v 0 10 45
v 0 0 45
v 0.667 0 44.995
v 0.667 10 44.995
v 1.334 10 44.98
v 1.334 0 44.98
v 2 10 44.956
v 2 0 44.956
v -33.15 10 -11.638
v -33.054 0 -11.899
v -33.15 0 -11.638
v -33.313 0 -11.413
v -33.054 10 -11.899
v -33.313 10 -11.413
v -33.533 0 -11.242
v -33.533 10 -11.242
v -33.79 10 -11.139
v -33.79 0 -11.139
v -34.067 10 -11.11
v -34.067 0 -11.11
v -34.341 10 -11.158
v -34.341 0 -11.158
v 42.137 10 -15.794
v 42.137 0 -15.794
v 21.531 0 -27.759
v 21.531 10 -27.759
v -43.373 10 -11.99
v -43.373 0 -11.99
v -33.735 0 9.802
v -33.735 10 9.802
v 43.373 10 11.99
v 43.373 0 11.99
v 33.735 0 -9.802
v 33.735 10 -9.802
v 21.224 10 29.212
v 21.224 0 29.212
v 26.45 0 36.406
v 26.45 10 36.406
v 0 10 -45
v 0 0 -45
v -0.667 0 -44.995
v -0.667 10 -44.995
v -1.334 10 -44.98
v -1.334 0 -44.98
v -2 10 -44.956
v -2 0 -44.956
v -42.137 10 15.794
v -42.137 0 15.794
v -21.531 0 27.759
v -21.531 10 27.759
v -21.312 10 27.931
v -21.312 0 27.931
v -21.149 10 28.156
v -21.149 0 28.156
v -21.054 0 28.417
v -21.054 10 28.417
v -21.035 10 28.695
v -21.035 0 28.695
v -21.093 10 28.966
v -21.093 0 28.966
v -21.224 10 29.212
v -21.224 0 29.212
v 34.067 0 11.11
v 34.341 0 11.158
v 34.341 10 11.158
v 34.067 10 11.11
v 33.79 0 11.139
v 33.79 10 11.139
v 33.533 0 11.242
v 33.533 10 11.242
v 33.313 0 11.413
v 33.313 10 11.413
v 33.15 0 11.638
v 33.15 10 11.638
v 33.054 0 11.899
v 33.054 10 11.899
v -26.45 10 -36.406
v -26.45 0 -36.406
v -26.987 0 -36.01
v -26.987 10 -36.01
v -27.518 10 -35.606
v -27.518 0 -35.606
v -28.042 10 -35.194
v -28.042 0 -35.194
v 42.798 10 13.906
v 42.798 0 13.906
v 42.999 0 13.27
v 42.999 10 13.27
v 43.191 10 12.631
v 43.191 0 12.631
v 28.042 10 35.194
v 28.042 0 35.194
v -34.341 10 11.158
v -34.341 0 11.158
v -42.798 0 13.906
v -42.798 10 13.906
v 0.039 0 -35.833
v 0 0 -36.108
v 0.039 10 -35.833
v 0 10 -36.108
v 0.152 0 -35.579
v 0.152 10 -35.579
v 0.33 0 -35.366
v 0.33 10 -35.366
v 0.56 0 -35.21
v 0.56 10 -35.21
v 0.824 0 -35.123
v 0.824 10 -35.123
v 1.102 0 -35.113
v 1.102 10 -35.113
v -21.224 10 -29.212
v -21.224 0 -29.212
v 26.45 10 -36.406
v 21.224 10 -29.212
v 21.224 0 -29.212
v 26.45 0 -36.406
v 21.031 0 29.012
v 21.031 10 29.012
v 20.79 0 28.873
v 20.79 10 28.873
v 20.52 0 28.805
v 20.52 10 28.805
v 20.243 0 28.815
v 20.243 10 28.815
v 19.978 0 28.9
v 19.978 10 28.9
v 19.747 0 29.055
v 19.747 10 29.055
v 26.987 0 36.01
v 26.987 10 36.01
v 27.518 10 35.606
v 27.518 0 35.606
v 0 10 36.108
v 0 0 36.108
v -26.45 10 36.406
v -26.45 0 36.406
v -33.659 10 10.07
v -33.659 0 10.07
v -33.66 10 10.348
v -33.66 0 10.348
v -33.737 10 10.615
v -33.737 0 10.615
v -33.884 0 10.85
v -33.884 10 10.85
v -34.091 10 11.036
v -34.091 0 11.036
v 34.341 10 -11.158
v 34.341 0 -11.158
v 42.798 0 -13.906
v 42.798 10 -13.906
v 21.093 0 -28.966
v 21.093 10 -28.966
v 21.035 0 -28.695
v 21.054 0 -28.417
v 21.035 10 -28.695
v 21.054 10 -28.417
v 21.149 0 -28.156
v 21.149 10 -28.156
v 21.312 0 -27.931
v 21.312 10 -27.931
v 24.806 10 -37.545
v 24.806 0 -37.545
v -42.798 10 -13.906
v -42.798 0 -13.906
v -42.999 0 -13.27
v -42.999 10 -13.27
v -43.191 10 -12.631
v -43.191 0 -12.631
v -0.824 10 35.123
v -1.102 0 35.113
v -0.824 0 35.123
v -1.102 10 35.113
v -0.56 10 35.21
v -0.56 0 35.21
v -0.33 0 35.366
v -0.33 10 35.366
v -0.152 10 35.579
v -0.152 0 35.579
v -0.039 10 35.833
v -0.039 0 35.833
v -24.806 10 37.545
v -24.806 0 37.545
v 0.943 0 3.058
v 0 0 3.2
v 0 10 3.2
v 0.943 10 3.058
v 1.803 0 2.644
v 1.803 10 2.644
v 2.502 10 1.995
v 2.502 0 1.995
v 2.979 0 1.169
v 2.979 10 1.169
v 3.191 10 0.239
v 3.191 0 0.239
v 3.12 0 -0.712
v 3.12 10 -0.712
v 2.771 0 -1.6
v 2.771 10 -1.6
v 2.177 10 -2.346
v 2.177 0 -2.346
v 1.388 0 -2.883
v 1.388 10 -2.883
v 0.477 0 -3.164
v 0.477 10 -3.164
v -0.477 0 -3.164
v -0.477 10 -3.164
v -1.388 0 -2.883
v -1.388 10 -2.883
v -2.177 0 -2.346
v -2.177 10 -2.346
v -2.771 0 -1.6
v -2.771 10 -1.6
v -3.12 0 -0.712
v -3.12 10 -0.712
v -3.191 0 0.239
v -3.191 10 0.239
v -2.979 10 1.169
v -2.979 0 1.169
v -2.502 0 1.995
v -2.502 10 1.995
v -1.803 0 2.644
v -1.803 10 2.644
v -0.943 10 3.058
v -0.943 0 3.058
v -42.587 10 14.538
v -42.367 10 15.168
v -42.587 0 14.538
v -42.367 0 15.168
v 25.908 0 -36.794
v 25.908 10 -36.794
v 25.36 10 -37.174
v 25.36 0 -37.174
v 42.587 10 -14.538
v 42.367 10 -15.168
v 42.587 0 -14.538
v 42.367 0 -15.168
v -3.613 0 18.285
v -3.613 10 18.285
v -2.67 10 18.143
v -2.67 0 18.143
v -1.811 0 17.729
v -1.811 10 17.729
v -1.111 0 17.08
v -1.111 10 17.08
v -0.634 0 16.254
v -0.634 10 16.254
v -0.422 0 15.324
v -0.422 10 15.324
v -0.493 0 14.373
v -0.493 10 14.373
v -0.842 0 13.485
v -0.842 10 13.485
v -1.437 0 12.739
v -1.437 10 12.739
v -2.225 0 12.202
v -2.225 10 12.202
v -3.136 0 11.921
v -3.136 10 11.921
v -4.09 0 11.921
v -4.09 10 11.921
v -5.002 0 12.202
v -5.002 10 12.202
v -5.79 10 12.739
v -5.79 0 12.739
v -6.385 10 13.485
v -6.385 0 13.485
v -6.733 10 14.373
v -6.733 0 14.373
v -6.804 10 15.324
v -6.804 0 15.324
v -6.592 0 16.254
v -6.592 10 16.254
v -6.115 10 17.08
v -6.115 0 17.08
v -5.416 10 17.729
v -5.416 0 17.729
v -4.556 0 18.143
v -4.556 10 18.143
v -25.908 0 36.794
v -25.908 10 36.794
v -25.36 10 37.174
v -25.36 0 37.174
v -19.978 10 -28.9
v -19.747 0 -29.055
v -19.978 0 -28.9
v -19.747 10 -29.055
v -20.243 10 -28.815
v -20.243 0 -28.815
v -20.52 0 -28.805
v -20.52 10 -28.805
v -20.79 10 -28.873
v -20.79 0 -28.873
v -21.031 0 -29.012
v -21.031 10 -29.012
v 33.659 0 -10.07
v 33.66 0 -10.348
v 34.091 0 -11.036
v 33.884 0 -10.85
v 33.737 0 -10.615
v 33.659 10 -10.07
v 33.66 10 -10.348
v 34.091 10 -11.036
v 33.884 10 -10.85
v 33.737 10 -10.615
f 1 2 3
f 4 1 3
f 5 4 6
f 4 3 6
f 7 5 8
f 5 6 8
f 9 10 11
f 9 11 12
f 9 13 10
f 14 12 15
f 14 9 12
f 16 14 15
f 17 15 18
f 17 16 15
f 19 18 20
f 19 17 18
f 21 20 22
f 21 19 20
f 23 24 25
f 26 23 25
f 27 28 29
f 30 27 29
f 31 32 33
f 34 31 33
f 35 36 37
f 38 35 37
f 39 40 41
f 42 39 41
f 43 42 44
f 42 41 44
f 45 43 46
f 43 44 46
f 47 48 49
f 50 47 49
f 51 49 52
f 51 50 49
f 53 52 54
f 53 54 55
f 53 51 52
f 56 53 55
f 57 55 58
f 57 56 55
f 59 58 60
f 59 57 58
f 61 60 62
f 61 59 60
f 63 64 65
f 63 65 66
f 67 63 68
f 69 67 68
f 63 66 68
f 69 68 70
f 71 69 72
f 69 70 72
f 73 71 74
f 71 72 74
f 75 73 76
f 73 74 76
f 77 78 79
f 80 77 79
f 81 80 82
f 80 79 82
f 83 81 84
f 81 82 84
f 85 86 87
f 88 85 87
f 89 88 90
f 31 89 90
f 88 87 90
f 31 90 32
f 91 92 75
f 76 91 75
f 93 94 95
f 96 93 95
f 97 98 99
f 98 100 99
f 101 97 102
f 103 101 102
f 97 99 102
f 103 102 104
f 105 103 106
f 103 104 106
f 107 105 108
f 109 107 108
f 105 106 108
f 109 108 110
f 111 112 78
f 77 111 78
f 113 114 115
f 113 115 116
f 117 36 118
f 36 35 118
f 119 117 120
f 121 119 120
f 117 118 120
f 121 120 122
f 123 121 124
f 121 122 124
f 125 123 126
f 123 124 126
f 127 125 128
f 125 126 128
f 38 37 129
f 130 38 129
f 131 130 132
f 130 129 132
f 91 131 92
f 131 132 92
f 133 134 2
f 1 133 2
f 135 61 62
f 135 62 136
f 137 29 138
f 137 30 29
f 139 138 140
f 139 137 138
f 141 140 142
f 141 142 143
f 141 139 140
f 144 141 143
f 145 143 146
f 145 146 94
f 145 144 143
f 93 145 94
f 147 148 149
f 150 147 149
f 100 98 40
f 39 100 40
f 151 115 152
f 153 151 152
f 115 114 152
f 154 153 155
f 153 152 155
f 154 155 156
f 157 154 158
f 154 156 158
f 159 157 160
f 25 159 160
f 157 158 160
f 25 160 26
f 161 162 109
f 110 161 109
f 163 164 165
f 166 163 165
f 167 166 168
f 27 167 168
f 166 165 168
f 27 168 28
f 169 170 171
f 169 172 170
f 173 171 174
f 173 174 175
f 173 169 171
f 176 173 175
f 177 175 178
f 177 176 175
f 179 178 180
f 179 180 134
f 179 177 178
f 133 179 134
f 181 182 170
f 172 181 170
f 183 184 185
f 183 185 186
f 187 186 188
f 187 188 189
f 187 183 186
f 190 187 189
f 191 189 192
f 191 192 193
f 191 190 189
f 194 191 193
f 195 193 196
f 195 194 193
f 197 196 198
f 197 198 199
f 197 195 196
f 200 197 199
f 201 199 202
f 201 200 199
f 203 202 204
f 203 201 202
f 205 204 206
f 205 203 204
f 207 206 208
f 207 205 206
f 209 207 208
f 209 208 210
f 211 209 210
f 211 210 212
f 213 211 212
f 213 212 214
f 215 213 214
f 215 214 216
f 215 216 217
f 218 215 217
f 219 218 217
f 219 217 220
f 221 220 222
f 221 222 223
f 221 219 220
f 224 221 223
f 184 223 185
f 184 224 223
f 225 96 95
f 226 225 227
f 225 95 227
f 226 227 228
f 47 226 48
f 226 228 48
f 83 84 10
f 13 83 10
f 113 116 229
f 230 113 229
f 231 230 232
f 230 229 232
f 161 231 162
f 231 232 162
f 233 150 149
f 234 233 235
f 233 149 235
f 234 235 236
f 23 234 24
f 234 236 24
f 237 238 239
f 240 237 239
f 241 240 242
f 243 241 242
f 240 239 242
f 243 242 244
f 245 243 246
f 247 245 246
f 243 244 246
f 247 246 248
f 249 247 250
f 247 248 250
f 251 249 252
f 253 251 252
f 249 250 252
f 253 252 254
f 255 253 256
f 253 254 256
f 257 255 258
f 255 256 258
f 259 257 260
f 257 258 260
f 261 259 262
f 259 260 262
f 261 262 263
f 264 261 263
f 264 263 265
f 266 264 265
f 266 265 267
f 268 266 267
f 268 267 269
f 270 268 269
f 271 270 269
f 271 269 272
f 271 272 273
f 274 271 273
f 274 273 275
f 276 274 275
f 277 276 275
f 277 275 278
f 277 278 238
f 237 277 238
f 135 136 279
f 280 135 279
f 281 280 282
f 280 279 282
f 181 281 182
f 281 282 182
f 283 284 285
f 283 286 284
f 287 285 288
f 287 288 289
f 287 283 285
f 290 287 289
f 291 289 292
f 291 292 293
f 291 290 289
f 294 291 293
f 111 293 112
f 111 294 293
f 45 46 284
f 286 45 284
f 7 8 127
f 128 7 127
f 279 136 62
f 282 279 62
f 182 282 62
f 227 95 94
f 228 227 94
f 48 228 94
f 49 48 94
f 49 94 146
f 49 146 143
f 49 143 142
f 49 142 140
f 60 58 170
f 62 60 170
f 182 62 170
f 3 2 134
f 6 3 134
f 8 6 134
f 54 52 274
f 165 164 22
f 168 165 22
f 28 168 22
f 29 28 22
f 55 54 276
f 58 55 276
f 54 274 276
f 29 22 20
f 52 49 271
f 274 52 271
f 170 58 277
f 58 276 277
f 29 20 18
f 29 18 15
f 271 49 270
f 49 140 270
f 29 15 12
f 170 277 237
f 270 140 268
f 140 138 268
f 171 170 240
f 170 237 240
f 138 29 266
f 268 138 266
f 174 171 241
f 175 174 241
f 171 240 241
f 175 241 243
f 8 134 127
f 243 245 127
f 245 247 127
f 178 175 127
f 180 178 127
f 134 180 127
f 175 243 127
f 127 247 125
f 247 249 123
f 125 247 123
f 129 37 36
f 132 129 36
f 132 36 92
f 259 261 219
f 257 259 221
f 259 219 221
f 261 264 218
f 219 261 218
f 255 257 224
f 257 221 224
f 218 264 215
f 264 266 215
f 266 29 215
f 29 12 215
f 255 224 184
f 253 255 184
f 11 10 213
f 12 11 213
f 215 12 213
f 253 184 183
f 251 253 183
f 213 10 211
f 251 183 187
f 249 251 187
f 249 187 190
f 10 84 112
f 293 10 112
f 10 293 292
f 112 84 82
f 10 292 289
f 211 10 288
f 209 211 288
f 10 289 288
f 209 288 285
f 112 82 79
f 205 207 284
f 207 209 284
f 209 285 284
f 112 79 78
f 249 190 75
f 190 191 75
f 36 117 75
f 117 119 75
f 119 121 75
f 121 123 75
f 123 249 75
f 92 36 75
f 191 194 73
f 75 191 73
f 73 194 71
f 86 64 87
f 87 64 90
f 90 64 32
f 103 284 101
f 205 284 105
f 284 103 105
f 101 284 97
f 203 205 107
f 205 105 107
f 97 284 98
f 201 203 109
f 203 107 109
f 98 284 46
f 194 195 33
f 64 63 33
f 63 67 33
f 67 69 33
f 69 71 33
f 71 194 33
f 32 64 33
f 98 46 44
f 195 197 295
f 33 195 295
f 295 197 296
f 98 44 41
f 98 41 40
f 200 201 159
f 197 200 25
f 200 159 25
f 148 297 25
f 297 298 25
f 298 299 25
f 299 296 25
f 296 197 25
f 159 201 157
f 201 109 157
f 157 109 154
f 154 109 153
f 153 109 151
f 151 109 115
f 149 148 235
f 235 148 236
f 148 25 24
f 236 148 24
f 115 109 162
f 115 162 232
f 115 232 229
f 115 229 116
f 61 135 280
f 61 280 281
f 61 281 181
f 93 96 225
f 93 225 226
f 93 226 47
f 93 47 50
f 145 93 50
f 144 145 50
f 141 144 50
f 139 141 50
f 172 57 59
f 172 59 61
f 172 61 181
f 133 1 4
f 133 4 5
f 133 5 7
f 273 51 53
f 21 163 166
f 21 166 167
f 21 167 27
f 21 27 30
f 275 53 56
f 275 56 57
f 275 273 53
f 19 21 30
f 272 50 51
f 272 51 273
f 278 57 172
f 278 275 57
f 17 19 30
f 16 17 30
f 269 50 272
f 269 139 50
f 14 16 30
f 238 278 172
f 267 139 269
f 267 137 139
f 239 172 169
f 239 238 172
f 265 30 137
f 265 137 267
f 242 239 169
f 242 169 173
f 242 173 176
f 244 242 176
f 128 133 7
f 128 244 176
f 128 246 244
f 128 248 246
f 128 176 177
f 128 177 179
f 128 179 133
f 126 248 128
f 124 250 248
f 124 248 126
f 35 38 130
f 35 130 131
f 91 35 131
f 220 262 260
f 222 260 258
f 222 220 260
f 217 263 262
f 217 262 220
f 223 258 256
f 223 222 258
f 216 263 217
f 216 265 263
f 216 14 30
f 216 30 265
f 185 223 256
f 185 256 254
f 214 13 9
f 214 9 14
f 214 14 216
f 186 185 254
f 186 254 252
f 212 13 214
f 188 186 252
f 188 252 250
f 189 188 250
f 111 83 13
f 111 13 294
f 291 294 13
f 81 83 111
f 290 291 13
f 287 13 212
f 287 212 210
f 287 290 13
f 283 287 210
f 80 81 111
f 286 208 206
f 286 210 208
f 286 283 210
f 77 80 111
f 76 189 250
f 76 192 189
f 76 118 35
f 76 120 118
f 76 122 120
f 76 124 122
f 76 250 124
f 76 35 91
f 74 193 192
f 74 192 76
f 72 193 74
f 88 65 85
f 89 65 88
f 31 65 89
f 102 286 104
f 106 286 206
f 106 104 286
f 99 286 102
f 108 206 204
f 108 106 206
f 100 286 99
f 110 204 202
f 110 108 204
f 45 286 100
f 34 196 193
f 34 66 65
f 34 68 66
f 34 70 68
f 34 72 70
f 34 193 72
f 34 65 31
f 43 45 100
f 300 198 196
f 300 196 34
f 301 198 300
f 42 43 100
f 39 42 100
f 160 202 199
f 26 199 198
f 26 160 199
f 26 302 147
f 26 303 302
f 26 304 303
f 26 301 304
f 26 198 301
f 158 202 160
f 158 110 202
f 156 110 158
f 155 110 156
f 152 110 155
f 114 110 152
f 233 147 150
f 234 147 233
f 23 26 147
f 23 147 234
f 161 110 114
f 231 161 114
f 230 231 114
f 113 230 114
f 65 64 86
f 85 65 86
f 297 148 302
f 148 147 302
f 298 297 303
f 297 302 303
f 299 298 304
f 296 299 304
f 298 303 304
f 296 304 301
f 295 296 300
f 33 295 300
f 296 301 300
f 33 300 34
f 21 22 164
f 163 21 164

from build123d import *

# Parameters (mm, degrees)
SKETCH2_R           = 3.2
BOSS_EXTRUDE1_DEPTH = 10
FILLET1_R           = 1
SKETCH3_R           = 3.2
CUT_EXTRUDE1_DEPTH  = 40


with BuildPart() as part:
    # Sketch2 → Boss-Extrude1 (new body)
    with BuildSketch(Plane(origin=(0, 0, 0), x_dir=(1, 0, 0), z_dir=(0, 1, 0))):
        with BuildLine():
            Line((-2, 44.955533586), (-20.57248383, 28.315594803))
            Line((-20.57248383, 28.315594803), (-26.450336353, 36.405764747))
            ThreePointArc((-26.450336353, 36.405764747), (-27.253018295, 35.808839605), (-28.04223364, 35.194220158))
            Line((-28.04223364, 35.194220158), (-33.28697807, 10.815594803))
            Line((-33.28697807, 10.815594803), (-42.797543233, 13.905764747))
            ThreePointArc((-42.797543233, 13.905764747), (-43.09606277, 12.951037555), (-43.373287149, 11.989910837))
            Line((-43.373287149, 11.989910837), (-33.28697807, -10.815594803))
            Line((-33.28697807, -10.815594803), (-42.797543233, -13.905764747))
            ThreePointArc((-42.797543233, -13.905764747), (-42.477876048, -14.853620651), (-42.137219172, -15.794136902))
            Line((-42.137219172, -15.794136902), (-20.57248383, -28.315594803))
            Line((-20.57248383, -28.315594803), (-26.450336353, -36.405764747))
            ThreePointArc((-26.450336353, -36.405764747), (-25.634584446, -36.984700625), (-24.806165662, -37.545361167))
            Line((-24.806165662, -37.545361167), (0, -35))
            Line((0, -35), (0, -45))
            ThreePointArc((0, -45), (1.000247127, -44.988882023), (2, -44.955533586))
            Line((2, -44.955533586), (20.57248383, -28.315594803))
            Line((20.57248383, -28.315594803), (26.450336353, -36.405764747))
            ThreePointArc((26.450336353, -36.405764747), (27.253018295, -35.808839605), (28.04223364, -35.194220158))
            Line((28.04223364, -35.194220158), (33.28697807, -10.815594803))
            Line((33.28697807, -10.815594803), (42.797543233, -13.905764747))
            ThreePointArc((42.797543233, -13.905764747), (43.09606277, -12.951037555), (43.373287149, -11.989910837))
            Line((43.373287149, -11.989910837), (33.28697807, 10.815594803))
            Line((33.28697807, 10.815594803), (42.797543233, 13.905764747))
            ThreePointArc((42.797543233, 13.905764747), (42.477876048, 14.853620651), (42.137219172, 15.794136902))
            Line((42.137219172, 15.794136902), (20.57248383, 28.315594803))
            Line((20.57248383, 28.315594803), (26.450336353, 36.405764747))
            ThreePointArc((26.450336353, 36.405764747), (25.634584446, 36.984700625), (24.806165662, 37.545361167))
            Line((24.806165662, 37.545361167), (0, 35))
            Line((0, 35), (0, 45))
            ThreePointArc((0, 45), (-1.000247127, 44.988882023), (-2, 44.955533586))
        make_face()
        with Locations(Location((0, 0, 0), (0, 0, 270))):
            Circle(SKETCH2_R, mode=Mode.SUBTRACT)
    extrude(amount=BOSS_EXTRUDE1_DEPTH)

    # Fillet1
    fillet1_edges = [part.edges().sort_by_distance(p)[0] for p in [
        (-20.57248383, 5, 28.315594803),
        (-33.28697807, 5, 10.815594803),
        (-33.28697807, 5, -10.815594803),
        (-20.57248383, 5, -28.315594803),
        (0, 5, -35),
        (20.57248383, 5, -28.315594803),
        (33.28697807, 5, -10.815594803),
        (33.28697807, 5, 10.815594803),
        (20.57248383, 5, 28.315594803),
        (0, 5, 35),
    ]]
    fillet(fillet1_edges, radius=FILLET1_R)

    # Sketch3 → Cut-Extrude1 (cut)
    with BuildSketch(Plane(origin=(352.77049505, 10, -1092.526706597), x_dir=(-0.9455896889977465, 0, 0.32536155283183854), z_dir=(0, 1, 0))):
        with Locations(Location((697.366992794, 931.392438652, 0), (0, 0, 71.012519009))):
            Circle(SKETCH3_R)
    extrude(amount=-CUT_EXTRUDE1_DEPTH, mode=Mode.SUBTRACT)


solid = part.part
